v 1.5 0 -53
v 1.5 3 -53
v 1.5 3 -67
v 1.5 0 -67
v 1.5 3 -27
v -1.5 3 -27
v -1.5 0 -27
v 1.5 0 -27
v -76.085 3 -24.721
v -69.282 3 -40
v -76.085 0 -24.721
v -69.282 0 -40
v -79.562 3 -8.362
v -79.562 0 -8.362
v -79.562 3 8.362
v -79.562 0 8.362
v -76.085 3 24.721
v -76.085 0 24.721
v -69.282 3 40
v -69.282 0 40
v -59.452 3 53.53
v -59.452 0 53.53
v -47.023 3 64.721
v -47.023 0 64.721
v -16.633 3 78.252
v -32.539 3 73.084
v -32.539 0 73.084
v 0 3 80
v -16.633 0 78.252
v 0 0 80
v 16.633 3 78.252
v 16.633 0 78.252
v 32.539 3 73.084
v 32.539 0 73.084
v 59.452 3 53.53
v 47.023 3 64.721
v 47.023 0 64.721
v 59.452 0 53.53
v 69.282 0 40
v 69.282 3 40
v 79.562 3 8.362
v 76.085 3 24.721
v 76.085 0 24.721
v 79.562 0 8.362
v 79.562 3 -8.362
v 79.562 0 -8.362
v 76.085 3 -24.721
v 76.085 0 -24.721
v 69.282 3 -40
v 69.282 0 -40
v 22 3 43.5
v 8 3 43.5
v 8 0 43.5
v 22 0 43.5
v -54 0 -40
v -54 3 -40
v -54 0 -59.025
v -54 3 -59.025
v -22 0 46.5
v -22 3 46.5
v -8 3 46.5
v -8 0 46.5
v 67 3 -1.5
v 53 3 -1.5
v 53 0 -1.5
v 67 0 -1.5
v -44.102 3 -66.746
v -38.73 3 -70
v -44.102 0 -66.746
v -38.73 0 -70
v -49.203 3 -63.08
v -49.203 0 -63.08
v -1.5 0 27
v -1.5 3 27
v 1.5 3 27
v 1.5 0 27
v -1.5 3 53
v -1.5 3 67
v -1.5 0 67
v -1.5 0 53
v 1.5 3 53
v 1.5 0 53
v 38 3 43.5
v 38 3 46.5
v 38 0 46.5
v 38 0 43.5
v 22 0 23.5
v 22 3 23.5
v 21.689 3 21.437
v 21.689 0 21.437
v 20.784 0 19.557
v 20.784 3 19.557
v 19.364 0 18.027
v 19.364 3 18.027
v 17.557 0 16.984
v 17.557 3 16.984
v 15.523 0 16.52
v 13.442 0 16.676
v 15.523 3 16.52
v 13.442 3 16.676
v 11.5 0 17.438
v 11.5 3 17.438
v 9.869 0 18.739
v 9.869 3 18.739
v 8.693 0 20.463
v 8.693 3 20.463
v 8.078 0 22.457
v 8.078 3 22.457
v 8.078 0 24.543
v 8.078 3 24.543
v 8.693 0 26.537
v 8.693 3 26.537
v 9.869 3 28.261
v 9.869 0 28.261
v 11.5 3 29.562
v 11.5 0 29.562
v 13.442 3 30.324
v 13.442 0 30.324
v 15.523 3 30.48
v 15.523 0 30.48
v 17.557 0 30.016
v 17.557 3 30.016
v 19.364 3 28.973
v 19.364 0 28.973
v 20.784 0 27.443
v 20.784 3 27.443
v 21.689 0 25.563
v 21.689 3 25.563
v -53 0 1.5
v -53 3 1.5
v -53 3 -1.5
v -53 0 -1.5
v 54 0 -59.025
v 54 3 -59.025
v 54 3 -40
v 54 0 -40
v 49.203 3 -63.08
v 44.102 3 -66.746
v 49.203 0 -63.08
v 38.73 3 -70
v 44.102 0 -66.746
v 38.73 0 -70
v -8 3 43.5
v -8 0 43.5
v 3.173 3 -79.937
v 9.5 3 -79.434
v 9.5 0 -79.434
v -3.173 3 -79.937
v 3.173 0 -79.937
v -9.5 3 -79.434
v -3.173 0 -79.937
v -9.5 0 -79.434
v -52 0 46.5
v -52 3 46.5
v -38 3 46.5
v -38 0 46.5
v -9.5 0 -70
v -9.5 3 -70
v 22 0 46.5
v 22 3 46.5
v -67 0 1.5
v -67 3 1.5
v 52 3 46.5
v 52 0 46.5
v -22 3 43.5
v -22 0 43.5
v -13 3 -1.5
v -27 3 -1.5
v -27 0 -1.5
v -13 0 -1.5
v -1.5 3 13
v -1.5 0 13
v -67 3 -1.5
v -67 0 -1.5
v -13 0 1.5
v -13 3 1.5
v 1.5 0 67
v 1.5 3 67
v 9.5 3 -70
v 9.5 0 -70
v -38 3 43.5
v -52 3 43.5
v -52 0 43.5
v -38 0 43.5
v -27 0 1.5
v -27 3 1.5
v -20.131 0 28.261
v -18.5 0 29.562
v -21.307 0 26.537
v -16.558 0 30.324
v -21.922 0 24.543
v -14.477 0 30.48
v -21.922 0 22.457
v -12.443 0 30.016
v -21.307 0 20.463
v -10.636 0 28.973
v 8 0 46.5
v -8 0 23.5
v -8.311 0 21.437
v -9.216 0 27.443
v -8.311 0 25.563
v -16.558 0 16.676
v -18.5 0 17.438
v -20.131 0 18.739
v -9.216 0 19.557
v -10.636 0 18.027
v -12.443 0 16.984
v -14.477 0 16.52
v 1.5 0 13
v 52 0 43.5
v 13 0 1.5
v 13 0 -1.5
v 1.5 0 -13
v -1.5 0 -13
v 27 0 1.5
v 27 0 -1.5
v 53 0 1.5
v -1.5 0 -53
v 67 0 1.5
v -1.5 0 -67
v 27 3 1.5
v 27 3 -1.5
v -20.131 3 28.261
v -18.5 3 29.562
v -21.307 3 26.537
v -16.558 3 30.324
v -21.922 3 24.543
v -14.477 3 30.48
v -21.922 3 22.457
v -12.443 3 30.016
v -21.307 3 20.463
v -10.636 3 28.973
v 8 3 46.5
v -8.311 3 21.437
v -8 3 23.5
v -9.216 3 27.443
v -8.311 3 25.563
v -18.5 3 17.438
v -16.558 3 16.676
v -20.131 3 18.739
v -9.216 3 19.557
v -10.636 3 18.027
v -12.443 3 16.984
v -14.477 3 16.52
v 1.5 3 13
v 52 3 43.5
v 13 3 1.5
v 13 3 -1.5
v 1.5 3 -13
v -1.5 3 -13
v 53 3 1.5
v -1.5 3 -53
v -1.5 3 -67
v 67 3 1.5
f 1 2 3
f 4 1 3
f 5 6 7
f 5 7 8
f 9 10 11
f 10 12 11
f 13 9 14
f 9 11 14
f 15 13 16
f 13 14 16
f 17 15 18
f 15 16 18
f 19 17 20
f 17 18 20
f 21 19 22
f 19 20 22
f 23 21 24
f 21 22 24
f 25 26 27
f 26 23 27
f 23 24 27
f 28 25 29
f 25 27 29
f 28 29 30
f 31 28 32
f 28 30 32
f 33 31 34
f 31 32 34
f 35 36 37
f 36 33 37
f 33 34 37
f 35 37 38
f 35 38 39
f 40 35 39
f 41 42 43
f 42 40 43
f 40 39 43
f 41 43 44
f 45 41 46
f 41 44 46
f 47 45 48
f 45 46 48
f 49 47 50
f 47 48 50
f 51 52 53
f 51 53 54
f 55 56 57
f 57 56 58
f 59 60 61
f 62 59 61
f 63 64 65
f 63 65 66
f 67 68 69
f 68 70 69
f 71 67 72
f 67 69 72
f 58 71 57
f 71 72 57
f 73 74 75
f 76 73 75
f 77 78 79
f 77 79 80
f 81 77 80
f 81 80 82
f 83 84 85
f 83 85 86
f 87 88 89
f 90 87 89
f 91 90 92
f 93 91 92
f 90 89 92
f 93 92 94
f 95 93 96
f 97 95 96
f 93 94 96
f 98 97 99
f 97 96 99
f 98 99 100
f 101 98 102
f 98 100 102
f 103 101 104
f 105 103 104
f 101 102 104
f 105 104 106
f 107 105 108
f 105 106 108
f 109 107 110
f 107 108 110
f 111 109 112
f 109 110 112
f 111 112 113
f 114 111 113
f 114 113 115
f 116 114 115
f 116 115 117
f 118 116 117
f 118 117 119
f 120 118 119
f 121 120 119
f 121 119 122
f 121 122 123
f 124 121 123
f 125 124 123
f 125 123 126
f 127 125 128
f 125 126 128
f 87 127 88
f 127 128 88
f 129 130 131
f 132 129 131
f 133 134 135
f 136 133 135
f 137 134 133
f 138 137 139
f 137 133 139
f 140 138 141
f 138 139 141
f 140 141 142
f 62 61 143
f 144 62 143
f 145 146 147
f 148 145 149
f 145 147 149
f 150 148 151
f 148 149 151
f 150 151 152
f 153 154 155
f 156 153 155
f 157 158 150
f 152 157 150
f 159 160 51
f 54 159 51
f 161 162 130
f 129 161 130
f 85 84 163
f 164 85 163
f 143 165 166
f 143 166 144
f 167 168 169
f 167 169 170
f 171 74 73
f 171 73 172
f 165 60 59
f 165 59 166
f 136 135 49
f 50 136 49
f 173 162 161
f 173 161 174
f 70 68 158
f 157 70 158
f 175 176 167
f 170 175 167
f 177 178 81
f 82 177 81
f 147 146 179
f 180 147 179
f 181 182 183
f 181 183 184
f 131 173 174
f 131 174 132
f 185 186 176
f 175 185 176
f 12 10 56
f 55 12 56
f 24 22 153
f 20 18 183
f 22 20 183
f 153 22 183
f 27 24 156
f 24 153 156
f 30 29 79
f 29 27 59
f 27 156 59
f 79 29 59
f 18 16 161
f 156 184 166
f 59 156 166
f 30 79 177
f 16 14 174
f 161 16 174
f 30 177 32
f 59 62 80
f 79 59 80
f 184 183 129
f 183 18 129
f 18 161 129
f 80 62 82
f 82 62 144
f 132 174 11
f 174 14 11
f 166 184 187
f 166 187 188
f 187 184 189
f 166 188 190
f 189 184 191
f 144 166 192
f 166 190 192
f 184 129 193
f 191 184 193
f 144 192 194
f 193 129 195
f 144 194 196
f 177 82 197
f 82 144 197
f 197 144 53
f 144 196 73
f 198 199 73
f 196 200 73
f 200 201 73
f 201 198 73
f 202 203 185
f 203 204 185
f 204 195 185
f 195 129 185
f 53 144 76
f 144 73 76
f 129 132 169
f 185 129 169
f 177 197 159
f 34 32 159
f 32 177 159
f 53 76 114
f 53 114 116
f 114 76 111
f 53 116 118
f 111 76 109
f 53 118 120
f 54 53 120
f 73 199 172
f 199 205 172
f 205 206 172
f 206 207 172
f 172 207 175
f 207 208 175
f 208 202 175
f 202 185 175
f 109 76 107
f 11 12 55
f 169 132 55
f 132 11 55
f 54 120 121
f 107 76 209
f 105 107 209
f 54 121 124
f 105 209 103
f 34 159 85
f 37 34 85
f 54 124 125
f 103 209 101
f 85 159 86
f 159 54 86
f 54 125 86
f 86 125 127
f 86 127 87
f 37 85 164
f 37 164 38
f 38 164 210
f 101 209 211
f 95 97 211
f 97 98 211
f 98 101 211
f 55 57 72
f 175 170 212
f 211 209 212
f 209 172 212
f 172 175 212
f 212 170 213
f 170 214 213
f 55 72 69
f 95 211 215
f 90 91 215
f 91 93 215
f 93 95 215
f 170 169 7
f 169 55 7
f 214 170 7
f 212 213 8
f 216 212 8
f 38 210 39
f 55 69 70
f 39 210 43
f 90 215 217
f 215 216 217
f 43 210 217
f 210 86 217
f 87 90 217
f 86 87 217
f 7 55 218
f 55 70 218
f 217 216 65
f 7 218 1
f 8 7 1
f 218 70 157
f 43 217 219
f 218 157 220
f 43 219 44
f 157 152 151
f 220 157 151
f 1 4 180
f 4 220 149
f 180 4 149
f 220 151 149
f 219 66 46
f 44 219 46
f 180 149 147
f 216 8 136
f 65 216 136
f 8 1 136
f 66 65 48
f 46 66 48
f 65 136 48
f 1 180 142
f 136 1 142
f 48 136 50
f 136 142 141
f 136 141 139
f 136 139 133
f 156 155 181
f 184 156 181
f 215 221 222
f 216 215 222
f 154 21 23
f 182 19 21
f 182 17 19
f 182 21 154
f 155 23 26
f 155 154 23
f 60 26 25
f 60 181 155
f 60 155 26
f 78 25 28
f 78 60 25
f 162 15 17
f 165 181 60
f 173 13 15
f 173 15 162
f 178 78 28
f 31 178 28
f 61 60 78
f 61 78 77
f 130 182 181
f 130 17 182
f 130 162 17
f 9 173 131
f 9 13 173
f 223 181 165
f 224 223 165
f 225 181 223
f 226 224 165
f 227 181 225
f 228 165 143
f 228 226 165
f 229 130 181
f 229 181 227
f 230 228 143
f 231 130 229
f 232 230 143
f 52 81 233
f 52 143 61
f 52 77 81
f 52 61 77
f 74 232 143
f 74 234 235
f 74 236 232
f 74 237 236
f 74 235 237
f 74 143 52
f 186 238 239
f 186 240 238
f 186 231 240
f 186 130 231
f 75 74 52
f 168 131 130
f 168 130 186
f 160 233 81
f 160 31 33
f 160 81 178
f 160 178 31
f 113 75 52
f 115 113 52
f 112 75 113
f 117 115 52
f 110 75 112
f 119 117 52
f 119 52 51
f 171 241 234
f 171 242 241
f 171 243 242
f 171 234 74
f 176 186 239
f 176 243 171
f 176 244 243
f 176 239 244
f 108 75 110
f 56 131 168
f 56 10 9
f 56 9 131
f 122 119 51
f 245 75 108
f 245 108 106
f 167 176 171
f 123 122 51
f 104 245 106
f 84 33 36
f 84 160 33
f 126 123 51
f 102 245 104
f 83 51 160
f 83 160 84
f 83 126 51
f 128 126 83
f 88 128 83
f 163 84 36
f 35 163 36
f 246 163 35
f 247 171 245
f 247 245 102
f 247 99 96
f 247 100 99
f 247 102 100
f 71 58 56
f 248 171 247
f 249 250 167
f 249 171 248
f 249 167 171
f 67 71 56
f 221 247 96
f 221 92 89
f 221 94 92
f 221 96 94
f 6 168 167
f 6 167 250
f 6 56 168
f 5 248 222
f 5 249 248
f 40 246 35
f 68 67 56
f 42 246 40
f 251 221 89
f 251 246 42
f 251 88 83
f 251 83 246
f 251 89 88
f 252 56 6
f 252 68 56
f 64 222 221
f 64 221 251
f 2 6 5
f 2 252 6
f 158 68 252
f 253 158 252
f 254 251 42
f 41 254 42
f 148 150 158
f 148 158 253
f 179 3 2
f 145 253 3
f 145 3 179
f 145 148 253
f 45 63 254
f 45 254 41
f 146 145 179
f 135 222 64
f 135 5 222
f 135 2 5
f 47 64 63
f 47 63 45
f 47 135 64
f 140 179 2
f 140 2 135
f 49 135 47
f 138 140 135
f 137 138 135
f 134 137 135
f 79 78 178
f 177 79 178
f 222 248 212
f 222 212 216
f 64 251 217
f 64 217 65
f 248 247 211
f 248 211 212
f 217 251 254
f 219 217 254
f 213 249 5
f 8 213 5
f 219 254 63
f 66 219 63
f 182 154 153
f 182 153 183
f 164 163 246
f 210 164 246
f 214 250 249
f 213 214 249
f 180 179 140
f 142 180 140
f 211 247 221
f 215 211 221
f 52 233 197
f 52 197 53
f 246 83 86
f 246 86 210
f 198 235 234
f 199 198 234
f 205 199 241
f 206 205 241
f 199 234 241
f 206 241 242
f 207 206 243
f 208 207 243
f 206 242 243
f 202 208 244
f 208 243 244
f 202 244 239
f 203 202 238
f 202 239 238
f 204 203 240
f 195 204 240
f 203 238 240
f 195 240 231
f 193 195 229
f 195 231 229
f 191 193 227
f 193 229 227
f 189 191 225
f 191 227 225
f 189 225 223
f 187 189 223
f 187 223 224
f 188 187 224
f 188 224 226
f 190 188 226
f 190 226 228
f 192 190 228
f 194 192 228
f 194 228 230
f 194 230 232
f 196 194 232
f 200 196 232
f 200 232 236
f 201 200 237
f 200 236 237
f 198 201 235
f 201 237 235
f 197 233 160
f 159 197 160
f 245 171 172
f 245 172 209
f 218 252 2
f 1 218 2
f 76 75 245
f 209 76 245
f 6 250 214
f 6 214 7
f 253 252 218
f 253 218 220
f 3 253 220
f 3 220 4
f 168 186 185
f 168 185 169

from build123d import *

# Parameters (mm, degrees)
SKETCH1_R               = 80
BOSS_EXTRUDE1_DEPTH     = 3
SKETCH2_W               = 3
SKETCH2_H               = 14
SKETCH2_W_2             = 14
SKETCH2_H_2             = 3
CUT_EXTRUDE1_DEPTH      = 3
CUT_EXTRUDE3_DEPTH      = 1
CUT_EXTRUDE3_DEPTH_BACK = 3
CUT_EXTRUDE4_DEPTH      = 1
CUT_EXTRUDE4_DEPTH_BACK = 3
CUT_EXTRUDE5_DEPTH      = 1
CUT_EXTRUDE5_DEPTH_BACK = 3
CUT_EXTRUDE6_DEPTH      = 1
CUT_EXTRUDE6_DEPTH_BACK = 3
SKETCH7_R               = 7
CUT_EXTRUDE7_DEPTH      = 3


with BuildPart() as part:
    # Sketch1 → Boss-Extrude1 (new body)
    with BuildSketch(Plane(origin=(0, 0, 0), x_dir=(1, 0, 0), z_dir=(0, 1, 0))):
        Circle(SKETCH1_R)
    extrude(amount=BOSS_EXTRUDE1_DEPTH)

    # Sketch2 → Cut-Extrude1 (cut)
    with BuildSketch(Plane(origin=(0, 3, 0), x_dir=(1, 0, 0), z_dir=(0, 1, 0))):
        with Locations((0, 20)):
            Rectangle(SKETCH2_W, SKETCH2_H)
        with Locations((0, 60)):
            Rectangle(SKETCH2_W, SKETCH2_H)
        with Locations((-20, 0)):
            Rectangle(SKETCH2_W_2, SKETCH2_H_2)
        with Locations((-60, 0)):
            Rectangle(SKETCH2_W_2, SKETCH2_H_2)
        with Locations((20, 0)):
            Rectangle(SKETCH2_W_2, SKETCH2_H_2)
        with Locations((60, 0)):
            Rectangle(SKETCH2_W_2, SKETCH2_H_2)
        with Locations((0, -20)):
            Rectangle(SKETCH2_W, SKETCH2_H)
        with Locations((0, -60)):
            Rectangle(SKETCH2_W, SKETCH2_H)
        with Locations((-15, -45)):
            Rectangle(SKETCH2_W_2, SKETCH2_H_2)
        with Locations((15, -45)):
            Rectangle(SKETCH2_W_2, SKETCH2_H_2)
        with Locations((-45, -45)):
            Rectangle(SKETCH2_W_2, SKETCH2_H_2)
        with Locations((45, -45)):
            Rectangle(SKETCH2_W_2, SKETCH2_H_2)
    extrude(amount=-CUT_EXTRUDE1_DEPTH, mode=Mode.SUBTRACT)

    # Sketch3 → Cut-Extrude3 (cut, two sides)
    with BuildSketch(Plane(origin=(0, 3, 0), x_dir=(1, 0, 0), z_dir=(0, 1, 0))) as cut_extrude3_sk:
        Polygon((-465.463683449, 40), (-69.282032303, 40), (-54, 40), (-54, 59.025418253), (-54, 455.2070694), (-616.816816127, 1012.949693112), (-1028.280499576, 597.742623712), align=None)
    extrude(amount=CUT_EXTRUDE3_DEPTH, mode=Mode.SUBTRACT)
    extrude(cut_extrude3_sk.sketch, amount=-CUT_EXTRUDE3_DEPTH_BACK, mode=Mode.SUBTRACT)

    # Sketch4 → Cut-Extrude4 (cut, two sides)
    with BuildSketch(Plane(origin=(0, 3, 0), x_dir=(1, 0, 0), z_dir=(0, 1, 0))) as cut_extrude4_sk:
        Polygon((465.463683449, 40), (69.282032303, 40), (54, 40), (54, 59.025418253), (54, 455.2070694), (616.816816127, 1012.949693112), (1028.280499576, 597.742623712), align=None)
    extrude(amount=CUT_EXTRUDE4_DEPTH, mode=Mode.SUBTRACT)
    extrude(cut_extrude4_sk.sketch, amount=-CUT_EXTRUDE4_DEPTH_BACK, mode=Mode.SUBTRACT)

    # Sketch5 → Cut-Extrude5 (cut, two sides)
    with BuildSketch(Plane(origin=(0, 3, 0), x_dir=(1, 0, 0), z_dir=(0, 1, 0))) as cut_extrude5_sk:
        Polygon((-431.335496535, 70), (-38.729833462, 70), (-9.5, 70), (-9.5, 79.433934814), (-9.5, 472.039597887), (-551.23098741, 1040.444703413), (-973.066483945, 638.405105526), align=None)
    extrude(amount=CUT_EXTRUDE5_DEPTH, mode=Mode.SUBTRACT)
    extrude(cut_extrude5_sk.sketch, amount=-CUT_EXTRUDE5_DEPTH_BACK, mode=Mode.SUBTRACT)

    # Sketch6 → Cut-Extrude6 (cut, two sides)
    with BuildSketch(Plane(origin=(0, 3, 0), x_dir=(1, 0, 0), z_dir=(0, 1, 0))) as cut_extrude6_sk:
        Polygon((431.335496535, 70), (38.729833462, 70), (9.5, 70), (9.5, 79.433934814), (9.5, 472.039597887), (551.23098741, 1040.444703413), (973.066483945, 638.405105526), align=None)
    extrude(amount=CUT_EXTRUDE6_DEPTH, mode=Mode.SUBTRACT)
    extrude(cut_extrude6_sk.sketch, amount=-CUT_EXTRUDE6_DEPTH_BACK, mode=Mode.SUBTRACT)

    # Sketch7 → Cut-Extrude7 (cut)
    with BuildSketch(Plane(origin=(0, 3, 0), x_dir=(1, 0, 0), z_dir=(0, 1, 0))):
        with Locations((-15, -23.5)):
            Circle(SKETCH7_R)
        with Locations((15, -23.5)):
            Circle(SKETCH7_R)
    extrude(amount=-CUT_EXTRUDE7_DEPTH, mode=Mode.SUBTRACT)


solid = part.part
